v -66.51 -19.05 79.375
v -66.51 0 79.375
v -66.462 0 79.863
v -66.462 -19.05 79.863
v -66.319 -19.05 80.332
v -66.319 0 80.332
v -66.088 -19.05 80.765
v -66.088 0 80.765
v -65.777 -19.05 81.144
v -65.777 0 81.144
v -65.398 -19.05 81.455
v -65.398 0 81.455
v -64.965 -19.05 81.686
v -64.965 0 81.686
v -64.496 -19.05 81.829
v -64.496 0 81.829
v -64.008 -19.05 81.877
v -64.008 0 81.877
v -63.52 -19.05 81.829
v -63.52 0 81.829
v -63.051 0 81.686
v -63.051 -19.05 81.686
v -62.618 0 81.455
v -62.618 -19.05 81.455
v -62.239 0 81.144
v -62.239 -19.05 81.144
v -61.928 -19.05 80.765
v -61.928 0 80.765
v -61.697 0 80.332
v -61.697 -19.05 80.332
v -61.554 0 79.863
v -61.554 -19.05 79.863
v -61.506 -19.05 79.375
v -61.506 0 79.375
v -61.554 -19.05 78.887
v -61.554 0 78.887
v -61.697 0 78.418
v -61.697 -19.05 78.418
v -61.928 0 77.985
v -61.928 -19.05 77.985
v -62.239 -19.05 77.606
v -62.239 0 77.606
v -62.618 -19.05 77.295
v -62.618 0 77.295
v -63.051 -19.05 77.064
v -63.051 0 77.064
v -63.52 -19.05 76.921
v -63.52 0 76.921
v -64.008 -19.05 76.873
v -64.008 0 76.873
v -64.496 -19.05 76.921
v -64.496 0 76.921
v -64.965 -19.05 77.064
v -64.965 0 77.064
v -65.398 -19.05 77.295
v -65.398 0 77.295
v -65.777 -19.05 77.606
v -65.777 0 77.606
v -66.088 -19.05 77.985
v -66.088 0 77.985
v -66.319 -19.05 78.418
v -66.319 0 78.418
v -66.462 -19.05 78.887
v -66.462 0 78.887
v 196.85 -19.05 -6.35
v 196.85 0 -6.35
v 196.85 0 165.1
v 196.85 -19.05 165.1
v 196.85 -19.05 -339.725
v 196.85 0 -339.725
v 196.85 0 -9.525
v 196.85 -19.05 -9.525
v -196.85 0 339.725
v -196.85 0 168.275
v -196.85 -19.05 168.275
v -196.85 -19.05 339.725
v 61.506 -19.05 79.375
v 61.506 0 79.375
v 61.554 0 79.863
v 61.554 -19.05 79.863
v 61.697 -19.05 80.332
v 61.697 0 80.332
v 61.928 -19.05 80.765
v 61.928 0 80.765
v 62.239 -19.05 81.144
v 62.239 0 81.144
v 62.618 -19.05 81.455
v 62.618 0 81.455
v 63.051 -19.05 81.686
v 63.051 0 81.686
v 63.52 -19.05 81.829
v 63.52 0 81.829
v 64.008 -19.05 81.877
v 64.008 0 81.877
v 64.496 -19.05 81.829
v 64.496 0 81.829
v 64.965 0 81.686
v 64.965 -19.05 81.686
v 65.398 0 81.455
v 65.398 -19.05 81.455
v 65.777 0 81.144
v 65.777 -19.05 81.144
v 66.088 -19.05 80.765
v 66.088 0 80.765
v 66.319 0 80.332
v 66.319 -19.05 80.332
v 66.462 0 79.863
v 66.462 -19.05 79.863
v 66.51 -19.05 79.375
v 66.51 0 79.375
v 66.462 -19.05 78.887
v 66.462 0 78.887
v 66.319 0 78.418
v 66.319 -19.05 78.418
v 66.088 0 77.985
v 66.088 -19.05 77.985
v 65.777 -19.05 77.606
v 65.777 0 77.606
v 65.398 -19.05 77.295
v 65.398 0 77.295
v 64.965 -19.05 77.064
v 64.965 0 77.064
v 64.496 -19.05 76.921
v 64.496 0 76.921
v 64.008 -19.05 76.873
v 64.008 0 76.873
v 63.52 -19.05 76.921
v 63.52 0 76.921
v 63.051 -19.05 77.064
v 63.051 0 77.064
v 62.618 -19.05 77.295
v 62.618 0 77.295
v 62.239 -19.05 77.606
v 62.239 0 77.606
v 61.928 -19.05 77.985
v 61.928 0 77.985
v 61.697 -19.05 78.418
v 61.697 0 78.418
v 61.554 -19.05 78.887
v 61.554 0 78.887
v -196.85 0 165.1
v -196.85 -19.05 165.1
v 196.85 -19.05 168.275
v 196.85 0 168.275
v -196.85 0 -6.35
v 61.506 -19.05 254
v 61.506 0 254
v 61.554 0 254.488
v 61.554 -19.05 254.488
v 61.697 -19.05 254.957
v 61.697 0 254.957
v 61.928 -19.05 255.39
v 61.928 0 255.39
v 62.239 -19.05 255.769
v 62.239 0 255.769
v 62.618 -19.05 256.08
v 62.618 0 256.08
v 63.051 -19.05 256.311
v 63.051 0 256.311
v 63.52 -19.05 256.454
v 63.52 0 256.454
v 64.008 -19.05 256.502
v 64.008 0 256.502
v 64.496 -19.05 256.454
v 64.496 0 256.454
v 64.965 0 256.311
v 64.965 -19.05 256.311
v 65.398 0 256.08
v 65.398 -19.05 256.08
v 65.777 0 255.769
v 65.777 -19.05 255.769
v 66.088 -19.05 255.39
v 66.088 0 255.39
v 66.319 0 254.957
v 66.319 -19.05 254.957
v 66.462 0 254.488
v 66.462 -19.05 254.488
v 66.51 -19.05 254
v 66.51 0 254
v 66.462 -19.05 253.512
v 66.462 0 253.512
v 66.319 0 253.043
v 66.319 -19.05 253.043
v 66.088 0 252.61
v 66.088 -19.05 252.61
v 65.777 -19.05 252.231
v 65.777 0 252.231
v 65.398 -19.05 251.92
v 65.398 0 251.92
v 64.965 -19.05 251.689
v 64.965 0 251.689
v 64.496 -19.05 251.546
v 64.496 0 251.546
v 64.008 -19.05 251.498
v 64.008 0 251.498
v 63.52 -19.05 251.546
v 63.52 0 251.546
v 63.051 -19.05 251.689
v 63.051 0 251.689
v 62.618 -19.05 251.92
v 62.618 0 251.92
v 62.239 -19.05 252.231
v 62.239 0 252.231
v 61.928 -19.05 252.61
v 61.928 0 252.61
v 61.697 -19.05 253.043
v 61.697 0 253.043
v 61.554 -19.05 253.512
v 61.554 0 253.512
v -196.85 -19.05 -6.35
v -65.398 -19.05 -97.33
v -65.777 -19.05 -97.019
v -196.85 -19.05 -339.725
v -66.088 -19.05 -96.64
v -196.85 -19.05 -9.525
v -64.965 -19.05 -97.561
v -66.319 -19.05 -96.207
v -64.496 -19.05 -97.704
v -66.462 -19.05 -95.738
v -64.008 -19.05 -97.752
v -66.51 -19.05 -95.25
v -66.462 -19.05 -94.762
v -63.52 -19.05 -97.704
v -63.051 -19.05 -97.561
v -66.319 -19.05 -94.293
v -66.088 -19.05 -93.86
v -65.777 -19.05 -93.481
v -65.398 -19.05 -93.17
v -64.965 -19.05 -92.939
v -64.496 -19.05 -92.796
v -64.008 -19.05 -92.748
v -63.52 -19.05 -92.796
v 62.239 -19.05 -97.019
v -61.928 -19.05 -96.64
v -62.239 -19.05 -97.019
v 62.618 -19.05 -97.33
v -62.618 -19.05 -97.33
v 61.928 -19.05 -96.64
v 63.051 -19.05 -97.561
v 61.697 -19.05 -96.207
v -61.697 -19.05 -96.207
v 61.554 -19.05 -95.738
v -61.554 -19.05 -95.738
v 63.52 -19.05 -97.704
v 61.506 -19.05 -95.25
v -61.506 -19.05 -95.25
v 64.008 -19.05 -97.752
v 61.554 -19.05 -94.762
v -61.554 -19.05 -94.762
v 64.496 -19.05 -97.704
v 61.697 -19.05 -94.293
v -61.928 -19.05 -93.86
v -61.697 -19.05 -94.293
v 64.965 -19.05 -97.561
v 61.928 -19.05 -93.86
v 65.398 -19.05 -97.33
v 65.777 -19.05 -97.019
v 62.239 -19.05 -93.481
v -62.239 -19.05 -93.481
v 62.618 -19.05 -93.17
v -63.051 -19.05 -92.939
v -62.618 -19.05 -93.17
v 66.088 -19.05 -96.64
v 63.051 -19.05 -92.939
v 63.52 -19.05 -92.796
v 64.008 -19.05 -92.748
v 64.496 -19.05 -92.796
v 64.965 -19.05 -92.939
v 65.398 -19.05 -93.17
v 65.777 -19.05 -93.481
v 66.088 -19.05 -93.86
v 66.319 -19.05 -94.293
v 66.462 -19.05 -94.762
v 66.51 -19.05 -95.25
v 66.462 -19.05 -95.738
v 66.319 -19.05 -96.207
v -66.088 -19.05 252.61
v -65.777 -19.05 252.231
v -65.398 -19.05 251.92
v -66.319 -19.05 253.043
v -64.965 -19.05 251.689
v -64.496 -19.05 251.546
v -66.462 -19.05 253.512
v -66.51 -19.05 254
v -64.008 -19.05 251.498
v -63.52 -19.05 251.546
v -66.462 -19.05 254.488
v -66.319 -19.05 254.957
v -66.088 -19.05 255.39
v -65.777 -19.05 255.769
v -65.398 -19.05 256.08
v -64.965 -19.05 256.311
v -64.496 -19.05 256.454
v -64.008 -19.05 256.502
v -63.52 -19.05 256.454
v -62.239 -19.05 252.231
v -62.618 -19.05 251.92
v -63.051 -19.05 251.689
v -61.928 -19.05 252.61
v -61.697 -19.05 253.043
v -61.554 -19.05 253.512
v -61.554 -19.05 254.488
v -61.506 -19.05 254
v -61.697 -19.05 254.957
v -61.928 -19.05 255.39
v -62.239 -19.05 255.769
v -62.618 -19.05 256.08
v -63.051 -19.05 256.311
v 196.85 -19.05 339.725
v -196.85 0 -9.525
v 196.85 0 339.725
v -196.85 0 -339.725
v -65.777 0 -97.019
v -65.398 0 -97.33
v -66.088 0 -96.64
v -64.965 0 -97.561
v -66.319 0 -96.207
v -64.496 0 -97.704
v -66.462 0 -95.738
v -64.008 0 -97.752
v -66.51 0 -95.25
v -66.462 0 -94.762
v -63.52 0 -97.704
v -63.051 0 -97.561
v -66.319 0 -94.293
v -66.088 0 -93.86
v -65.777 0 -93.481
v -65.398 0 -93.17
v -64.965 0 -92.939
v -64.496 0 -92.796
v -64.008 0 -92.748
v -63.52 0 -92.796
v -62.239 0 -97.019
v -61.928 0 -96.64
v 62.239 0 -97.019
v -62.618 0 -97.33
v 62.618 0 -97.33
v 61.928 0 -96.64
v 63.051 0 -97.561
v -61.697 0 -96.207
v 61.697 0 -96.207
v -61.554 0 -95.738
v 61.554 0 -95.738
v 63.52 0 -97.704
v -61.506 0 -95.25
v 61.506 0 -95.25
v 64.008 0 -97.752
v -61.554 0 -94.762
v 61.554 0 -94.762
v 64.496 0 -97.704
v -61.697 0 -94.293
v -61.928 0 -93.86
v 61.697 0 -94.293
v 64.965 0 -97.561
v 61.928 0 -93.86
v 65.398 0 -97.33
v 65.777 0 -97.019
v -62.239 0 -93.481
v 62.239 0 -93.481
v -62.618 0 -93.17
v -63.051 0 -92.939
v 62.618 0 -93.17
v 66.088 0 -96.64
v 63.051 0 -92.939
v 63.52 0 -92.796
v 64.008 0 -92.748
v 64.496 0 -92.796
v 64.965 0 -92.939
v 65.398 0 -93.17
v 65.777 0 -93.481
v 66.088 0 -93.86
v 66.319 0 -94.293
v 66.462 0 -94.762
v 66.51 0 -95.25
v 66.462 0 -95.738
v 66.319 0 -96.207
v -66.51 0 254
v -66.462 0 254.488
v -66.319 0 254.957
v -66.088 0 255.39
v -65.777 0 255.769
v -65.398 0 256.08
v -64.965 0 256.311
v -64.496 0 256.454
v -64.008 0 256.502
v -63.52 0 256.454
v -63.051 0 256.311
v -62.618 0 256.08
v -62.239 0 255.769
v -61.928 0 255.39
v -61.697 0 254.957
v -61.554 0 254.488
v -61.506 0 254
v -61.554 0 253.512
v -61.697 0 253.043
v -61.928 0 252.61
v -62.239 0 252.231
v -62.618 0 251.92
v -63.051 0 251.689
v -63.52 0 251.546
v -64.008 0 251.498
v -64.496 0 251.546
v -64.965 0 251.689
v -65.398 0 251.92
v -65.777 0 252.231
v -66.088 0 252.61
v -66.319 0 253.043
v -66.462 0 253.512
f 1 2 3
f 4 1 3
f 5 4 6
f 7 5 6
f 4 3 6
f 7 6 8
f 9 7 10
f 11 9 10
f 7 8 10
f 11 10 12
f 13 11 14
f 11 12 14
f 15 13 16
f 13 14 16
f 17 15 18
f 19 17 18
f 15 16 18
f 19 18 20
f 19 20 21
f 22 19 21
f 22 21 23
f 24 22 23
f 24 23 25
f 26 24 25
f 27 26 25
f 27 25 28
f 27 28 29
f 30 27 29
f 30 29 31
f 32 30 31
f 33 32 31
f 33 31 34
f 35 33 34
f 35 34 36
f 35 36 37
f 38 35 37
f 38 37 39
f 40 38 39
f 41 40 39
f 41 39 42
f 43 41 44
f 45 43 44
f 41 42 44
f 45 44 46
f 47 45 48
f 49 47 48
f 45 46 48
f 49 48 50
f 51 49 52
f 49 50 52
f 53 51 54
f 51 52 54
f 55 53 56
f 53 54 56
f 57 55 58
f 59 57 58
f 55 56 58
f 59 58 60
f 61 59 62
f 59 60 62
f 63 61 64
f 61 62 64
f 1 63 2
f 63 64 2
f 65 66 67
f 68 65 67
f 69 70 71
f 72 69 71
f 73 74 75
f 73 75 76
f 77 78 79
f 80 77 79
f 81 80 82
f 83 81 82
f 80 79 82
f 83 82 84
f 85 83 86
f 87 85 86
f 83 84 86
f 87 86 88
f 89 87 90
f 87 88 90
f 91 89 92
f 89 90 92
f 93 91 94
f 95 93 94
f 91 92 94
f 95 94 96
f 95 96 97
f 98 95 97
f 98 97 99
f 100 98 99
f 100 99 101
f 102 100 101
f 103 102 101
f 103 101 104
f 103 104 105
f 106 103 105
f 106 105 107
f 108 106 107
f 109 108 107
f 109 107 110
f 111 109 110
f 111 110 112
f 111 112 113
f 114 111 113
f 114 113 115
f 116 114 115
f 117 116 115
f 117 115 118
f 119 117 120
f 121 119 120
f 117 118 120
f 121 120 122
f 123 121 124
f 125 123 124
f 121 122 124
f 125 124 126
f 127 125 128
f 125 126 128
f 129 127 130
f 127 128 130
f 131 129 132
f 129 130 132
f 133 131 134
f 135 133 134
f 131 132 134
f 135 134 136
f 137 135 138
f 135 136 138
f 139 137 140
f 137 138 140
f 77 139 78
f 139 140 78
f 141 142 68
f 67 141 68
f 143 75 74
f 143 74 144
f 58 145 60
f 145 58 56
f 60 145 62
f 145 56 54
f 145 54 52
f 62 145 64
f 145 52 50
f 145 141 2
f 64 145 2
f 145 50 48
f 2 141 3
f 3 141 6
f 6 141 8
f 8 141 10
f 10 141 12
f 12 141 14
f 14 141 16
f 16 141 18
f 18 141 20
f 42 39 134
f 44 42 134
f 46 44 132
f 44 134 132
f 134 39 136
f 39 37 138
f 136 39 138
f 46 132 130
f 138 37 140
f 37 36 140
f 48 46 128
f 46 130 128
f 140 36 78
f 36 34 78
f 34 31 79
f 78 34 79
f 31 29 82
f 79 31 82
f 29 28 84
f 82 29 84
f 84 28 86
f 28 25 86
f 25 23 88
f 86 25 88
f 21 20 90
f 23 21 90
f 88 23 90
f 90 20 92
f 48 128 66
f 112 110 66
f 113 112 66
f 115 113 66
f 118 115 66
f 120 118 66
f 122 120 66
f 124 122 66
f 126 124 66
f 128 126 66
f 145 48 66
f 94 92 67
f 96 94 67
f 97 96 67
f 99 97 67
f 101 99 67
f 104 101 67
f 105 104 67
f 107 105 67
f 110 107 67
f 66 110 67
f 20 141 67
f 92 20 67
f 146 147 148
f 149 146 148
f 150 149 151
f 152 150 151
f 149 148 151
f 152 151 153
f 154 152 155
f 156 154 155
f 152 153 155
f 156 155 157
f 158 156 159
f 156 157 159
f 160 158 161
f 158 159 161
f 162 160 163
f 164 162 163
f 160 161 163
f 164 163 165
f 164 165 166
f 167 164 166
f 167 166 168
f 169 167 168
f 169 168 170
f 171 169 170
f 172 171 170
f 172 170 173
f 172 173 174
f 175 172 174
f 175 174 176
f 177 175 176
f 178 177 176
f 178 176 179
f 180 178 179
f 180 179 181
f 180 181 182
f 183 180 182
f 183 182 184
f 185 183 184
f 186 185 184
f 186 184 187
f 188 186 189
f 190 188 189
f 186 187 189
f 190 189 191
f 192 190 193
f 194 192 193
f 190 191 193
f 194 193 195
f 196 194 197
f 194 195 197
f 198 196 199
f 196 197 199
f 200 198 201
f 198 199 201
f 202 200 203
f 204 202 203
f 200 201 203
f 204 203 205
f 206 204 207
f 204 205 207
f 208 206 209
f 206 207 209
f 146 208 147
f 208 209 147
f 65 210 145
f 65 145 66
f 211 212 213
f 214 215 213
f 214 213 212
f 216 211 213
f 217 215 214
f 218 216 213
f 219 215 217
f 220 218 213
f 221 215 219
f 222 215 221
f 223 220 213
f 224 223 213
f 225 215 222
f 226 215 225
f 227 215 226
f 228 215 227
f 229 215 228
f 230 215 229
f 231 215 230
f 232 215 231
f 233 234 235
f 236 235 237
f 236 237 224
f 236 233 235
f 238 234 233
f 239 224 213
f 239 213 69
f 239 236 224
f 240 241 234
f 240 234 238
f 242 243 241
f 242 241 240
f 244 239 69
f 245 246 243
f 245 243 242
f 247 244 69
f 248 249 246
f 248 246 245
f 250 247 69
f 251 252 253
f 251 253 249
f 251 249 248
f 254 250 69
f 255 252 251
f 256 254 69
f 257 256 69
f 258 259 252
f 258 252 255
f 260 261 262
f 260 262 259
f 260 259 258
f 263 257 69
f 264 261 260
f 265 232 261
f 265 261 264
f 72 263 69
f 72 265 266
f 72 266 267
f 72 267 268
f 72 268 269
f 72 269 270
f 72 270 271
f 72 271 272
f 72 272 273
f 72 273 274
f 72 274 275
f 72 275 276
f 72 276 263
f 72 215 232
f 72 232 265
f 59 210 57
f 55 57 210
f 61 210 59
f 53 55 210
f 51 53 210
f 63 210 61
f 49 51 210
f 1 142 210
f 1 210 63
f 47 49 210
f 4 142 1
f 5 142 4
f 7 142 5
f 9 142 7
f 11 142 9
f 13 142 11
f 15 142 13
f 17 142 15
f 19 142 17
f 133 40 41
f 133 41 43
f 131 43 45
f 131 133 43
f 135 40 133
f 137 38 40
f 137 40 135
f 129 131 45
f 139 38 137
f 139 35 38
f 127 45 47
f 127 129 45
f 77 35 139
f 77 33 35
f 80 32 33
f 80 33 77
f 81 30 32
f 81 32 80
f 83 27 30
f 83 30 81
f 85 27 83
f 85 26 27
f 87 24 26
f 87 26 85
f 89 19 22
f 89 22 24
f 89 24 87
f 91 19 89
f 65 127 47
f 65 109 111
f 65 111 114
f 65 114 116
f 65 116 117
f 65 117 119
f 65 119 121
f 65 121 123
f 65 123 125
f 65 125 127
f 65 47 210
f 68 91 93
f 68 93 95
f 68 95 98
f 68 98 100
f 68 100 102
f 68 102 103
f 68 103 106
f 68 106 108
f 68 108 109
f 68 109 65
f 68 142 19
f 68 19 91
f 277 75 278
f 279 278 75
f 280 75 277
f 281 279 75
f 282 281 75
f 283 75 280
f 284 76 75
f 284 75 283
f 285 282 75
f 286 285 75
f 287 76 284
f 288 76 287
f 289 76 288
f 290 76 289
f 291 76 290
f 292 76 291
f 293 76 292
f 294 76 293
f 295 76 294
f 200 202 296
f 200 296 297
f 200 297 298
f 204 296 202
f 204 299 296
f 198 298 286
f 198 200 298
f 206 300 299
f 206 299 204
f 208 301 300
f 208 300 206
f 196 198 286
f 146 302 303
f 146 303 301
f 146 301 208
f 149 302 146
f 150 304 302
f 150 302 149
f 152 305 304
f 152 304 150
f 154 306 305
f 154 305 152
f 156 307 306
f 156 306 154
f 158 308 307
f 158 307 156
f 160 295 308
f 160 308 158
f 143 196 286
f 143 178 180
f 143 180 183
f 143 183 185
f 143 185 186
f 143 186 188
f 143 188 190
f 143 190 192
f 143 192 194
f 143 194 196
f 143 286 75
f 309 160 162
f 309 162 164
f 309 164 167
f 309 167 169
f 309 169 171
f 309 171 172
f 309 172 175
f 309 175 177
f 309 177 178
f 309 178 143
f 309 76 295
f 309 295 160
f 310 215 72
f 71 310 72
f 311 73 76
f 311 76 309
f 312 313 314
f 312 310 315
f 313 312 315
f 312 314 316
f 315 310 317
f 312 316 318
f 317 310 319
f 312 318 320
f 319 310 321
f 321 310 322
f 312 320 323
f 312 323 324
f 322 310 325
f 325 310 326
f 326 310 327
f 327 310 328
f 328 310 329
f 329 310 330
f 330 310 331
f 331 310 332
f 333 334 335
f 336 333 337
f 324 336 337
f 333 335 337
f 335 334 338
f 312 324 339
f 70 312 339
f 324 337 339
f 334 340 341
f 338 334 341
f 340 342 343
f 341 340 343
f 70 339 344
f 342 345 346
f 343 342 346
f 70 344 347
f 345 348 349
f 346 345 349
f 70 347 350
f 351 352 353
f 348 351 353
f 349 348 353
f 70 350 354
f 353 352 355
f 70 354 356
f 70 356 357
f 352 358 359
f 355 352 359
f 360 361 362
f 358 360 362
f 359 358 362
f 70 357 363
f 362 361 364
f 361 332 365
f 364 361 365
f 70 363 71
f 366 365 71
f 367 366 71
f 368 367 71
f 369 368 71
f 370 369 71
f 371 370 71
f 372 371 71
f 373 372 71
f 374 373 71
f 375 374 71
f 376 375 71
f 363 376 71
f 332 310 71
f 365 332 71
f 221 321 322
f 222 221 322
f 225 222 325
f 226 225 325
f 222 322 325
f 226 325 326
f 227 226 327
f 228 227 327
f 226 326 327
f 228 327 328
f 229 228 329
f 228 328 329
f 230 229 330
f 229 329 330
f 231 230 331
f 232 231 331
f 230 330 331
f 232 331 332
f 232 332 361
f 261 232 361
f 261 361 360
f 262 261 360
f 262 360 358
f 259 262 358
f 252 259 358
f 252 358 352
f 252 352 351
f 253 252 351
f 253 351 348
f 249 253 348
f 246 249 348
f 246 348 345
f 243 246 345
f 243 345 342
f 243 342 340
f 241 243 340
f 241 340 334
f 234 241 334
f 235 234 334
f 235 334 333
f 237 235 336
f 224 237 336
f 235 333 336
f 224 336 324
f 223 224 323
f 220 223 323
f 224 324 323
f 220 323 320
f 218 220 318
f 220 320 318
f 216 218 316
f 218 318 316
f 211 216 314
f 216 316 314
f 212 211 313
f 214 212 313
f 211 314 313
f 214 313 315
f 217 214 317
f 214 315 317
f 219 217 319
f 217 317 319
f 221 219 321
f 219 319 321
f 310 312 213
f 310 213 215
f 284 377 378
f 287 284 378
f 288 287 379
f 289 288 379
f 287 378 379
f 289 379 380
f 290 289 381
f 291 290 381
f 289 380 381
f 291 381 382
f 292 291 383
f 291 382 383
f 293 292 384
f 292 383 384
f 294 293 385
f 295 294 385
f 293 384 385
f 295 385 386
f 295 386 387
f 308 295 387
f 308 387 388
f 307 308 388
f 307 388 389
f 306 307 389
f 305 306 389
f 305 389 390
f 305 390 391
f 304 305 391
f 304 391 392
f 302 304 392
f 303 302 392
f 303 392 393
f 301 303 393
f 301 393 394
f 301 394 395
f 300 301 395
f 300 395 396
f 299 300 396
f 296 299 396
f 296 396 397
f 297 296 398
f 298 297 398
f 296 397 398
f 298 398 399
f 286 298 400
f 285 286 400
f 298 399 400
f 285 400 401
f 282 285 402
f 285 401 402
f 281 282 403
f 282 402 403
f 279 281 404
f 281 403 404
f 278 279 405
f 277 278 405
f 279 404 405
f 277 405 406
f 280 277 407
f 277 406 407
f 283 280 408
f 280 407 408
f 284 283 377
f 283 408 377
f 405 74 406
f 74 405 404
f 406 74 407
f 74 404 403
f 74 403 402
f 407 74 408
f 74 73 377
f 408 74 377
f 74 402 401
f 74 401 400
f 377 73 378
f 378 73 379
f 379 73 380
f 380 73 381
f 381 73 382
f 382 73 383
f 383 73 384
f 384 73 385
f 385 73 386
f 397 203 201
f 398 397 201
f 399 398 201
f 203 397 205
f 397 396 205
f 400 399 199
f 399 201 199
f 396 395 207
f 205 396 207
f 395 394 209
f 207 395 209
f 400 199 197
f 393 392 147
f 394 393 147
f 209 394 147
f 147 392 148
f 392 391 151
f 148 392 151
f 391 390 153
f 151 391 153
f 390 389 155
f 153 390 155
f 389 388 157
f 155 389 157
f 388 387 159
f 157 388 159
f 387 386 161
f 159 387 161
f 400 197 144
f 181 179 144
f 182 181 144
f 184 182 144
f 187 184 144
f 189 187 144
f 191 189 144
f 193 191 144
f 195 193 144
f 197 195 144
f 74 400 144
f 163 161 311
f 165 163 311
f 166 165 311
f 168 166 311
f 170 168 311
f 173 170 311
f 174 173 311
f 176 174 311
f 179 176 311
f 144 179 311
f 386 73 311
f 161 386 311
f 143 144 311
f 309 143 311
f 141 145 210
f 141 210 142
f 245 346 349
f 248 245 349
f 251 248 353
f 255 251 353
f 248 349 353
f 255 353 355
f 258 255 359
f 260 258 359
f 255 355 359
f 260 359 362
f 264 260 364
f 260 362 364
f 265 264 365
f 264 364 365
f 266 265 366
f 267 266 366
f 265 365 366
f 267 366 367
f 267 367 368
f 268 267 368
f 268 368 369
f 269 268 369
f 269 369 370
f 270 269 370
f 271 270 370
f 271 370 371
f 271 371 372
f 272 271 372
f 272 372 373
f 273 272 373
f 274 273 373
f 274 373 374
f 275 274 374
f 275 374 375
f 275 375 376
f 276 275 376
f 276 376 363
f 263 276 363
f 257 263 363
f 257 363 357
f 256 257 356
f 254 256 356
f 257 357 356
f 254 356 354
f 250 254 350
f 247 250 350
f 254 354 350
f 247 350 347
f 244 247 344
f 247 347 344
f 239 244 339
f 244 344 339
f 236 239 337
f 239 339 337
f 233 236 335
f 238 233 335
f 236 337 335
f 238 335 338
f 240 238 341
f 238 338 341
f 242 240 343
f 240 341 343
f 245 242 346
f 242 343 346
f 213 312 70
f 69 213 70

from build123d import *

# Parameters (mm, degrees)
F0_W     = 393.7
F0_H     = 679.45
F1_DEPTH = 19.05
F2_W     = 393.7
F2_H     = 3.175
F3_DEPTH = 25.4
F5_D     = 5.0038
F7_D     = 5.0038
F9_D     = 5.0038


with BuildPart() as f1:
    # F0 (on Front) → F1 (new body)
    with BuildSketch(Plane.XZ):
        Rectangle(F0_W, F0_H)
    extrude(amount=F1_DEPTH)

    # F2 (on face) → F3 (cut)
    with BuildSketch(Plane.XZ.offset(19.05)):
        with Locations((0, 166.6875)):
            Rectangle(F2_W, F2_H)
        with Locations((0, -7.9375)):
            Rectangle(F2_W, F2_H)
    extrude(amount=-F3_DEPTH, mode=Mode.SUBTRACT)

    # F5 (through all)
    with Locations(Plane.XZ.offset(19.05)):
        with Locations((-64.008, 254), (64.008, 254)):
            Hole(F5_D / 2)

    # F7 (through all)
    with Locations(Plane.XZ.offset(19.05)):
        with Locations((-64.008, 79.375), (64.008, 79.375)):
            Hole(F7_D / 2)

    # F9 (through all)
    with Locations(Plane.XZ.offset(19.05)):
        with Locations((64.008, -95.25), (-64.008, -95.25)):
            Hole(F9_D / 2)


solid = f1.part
